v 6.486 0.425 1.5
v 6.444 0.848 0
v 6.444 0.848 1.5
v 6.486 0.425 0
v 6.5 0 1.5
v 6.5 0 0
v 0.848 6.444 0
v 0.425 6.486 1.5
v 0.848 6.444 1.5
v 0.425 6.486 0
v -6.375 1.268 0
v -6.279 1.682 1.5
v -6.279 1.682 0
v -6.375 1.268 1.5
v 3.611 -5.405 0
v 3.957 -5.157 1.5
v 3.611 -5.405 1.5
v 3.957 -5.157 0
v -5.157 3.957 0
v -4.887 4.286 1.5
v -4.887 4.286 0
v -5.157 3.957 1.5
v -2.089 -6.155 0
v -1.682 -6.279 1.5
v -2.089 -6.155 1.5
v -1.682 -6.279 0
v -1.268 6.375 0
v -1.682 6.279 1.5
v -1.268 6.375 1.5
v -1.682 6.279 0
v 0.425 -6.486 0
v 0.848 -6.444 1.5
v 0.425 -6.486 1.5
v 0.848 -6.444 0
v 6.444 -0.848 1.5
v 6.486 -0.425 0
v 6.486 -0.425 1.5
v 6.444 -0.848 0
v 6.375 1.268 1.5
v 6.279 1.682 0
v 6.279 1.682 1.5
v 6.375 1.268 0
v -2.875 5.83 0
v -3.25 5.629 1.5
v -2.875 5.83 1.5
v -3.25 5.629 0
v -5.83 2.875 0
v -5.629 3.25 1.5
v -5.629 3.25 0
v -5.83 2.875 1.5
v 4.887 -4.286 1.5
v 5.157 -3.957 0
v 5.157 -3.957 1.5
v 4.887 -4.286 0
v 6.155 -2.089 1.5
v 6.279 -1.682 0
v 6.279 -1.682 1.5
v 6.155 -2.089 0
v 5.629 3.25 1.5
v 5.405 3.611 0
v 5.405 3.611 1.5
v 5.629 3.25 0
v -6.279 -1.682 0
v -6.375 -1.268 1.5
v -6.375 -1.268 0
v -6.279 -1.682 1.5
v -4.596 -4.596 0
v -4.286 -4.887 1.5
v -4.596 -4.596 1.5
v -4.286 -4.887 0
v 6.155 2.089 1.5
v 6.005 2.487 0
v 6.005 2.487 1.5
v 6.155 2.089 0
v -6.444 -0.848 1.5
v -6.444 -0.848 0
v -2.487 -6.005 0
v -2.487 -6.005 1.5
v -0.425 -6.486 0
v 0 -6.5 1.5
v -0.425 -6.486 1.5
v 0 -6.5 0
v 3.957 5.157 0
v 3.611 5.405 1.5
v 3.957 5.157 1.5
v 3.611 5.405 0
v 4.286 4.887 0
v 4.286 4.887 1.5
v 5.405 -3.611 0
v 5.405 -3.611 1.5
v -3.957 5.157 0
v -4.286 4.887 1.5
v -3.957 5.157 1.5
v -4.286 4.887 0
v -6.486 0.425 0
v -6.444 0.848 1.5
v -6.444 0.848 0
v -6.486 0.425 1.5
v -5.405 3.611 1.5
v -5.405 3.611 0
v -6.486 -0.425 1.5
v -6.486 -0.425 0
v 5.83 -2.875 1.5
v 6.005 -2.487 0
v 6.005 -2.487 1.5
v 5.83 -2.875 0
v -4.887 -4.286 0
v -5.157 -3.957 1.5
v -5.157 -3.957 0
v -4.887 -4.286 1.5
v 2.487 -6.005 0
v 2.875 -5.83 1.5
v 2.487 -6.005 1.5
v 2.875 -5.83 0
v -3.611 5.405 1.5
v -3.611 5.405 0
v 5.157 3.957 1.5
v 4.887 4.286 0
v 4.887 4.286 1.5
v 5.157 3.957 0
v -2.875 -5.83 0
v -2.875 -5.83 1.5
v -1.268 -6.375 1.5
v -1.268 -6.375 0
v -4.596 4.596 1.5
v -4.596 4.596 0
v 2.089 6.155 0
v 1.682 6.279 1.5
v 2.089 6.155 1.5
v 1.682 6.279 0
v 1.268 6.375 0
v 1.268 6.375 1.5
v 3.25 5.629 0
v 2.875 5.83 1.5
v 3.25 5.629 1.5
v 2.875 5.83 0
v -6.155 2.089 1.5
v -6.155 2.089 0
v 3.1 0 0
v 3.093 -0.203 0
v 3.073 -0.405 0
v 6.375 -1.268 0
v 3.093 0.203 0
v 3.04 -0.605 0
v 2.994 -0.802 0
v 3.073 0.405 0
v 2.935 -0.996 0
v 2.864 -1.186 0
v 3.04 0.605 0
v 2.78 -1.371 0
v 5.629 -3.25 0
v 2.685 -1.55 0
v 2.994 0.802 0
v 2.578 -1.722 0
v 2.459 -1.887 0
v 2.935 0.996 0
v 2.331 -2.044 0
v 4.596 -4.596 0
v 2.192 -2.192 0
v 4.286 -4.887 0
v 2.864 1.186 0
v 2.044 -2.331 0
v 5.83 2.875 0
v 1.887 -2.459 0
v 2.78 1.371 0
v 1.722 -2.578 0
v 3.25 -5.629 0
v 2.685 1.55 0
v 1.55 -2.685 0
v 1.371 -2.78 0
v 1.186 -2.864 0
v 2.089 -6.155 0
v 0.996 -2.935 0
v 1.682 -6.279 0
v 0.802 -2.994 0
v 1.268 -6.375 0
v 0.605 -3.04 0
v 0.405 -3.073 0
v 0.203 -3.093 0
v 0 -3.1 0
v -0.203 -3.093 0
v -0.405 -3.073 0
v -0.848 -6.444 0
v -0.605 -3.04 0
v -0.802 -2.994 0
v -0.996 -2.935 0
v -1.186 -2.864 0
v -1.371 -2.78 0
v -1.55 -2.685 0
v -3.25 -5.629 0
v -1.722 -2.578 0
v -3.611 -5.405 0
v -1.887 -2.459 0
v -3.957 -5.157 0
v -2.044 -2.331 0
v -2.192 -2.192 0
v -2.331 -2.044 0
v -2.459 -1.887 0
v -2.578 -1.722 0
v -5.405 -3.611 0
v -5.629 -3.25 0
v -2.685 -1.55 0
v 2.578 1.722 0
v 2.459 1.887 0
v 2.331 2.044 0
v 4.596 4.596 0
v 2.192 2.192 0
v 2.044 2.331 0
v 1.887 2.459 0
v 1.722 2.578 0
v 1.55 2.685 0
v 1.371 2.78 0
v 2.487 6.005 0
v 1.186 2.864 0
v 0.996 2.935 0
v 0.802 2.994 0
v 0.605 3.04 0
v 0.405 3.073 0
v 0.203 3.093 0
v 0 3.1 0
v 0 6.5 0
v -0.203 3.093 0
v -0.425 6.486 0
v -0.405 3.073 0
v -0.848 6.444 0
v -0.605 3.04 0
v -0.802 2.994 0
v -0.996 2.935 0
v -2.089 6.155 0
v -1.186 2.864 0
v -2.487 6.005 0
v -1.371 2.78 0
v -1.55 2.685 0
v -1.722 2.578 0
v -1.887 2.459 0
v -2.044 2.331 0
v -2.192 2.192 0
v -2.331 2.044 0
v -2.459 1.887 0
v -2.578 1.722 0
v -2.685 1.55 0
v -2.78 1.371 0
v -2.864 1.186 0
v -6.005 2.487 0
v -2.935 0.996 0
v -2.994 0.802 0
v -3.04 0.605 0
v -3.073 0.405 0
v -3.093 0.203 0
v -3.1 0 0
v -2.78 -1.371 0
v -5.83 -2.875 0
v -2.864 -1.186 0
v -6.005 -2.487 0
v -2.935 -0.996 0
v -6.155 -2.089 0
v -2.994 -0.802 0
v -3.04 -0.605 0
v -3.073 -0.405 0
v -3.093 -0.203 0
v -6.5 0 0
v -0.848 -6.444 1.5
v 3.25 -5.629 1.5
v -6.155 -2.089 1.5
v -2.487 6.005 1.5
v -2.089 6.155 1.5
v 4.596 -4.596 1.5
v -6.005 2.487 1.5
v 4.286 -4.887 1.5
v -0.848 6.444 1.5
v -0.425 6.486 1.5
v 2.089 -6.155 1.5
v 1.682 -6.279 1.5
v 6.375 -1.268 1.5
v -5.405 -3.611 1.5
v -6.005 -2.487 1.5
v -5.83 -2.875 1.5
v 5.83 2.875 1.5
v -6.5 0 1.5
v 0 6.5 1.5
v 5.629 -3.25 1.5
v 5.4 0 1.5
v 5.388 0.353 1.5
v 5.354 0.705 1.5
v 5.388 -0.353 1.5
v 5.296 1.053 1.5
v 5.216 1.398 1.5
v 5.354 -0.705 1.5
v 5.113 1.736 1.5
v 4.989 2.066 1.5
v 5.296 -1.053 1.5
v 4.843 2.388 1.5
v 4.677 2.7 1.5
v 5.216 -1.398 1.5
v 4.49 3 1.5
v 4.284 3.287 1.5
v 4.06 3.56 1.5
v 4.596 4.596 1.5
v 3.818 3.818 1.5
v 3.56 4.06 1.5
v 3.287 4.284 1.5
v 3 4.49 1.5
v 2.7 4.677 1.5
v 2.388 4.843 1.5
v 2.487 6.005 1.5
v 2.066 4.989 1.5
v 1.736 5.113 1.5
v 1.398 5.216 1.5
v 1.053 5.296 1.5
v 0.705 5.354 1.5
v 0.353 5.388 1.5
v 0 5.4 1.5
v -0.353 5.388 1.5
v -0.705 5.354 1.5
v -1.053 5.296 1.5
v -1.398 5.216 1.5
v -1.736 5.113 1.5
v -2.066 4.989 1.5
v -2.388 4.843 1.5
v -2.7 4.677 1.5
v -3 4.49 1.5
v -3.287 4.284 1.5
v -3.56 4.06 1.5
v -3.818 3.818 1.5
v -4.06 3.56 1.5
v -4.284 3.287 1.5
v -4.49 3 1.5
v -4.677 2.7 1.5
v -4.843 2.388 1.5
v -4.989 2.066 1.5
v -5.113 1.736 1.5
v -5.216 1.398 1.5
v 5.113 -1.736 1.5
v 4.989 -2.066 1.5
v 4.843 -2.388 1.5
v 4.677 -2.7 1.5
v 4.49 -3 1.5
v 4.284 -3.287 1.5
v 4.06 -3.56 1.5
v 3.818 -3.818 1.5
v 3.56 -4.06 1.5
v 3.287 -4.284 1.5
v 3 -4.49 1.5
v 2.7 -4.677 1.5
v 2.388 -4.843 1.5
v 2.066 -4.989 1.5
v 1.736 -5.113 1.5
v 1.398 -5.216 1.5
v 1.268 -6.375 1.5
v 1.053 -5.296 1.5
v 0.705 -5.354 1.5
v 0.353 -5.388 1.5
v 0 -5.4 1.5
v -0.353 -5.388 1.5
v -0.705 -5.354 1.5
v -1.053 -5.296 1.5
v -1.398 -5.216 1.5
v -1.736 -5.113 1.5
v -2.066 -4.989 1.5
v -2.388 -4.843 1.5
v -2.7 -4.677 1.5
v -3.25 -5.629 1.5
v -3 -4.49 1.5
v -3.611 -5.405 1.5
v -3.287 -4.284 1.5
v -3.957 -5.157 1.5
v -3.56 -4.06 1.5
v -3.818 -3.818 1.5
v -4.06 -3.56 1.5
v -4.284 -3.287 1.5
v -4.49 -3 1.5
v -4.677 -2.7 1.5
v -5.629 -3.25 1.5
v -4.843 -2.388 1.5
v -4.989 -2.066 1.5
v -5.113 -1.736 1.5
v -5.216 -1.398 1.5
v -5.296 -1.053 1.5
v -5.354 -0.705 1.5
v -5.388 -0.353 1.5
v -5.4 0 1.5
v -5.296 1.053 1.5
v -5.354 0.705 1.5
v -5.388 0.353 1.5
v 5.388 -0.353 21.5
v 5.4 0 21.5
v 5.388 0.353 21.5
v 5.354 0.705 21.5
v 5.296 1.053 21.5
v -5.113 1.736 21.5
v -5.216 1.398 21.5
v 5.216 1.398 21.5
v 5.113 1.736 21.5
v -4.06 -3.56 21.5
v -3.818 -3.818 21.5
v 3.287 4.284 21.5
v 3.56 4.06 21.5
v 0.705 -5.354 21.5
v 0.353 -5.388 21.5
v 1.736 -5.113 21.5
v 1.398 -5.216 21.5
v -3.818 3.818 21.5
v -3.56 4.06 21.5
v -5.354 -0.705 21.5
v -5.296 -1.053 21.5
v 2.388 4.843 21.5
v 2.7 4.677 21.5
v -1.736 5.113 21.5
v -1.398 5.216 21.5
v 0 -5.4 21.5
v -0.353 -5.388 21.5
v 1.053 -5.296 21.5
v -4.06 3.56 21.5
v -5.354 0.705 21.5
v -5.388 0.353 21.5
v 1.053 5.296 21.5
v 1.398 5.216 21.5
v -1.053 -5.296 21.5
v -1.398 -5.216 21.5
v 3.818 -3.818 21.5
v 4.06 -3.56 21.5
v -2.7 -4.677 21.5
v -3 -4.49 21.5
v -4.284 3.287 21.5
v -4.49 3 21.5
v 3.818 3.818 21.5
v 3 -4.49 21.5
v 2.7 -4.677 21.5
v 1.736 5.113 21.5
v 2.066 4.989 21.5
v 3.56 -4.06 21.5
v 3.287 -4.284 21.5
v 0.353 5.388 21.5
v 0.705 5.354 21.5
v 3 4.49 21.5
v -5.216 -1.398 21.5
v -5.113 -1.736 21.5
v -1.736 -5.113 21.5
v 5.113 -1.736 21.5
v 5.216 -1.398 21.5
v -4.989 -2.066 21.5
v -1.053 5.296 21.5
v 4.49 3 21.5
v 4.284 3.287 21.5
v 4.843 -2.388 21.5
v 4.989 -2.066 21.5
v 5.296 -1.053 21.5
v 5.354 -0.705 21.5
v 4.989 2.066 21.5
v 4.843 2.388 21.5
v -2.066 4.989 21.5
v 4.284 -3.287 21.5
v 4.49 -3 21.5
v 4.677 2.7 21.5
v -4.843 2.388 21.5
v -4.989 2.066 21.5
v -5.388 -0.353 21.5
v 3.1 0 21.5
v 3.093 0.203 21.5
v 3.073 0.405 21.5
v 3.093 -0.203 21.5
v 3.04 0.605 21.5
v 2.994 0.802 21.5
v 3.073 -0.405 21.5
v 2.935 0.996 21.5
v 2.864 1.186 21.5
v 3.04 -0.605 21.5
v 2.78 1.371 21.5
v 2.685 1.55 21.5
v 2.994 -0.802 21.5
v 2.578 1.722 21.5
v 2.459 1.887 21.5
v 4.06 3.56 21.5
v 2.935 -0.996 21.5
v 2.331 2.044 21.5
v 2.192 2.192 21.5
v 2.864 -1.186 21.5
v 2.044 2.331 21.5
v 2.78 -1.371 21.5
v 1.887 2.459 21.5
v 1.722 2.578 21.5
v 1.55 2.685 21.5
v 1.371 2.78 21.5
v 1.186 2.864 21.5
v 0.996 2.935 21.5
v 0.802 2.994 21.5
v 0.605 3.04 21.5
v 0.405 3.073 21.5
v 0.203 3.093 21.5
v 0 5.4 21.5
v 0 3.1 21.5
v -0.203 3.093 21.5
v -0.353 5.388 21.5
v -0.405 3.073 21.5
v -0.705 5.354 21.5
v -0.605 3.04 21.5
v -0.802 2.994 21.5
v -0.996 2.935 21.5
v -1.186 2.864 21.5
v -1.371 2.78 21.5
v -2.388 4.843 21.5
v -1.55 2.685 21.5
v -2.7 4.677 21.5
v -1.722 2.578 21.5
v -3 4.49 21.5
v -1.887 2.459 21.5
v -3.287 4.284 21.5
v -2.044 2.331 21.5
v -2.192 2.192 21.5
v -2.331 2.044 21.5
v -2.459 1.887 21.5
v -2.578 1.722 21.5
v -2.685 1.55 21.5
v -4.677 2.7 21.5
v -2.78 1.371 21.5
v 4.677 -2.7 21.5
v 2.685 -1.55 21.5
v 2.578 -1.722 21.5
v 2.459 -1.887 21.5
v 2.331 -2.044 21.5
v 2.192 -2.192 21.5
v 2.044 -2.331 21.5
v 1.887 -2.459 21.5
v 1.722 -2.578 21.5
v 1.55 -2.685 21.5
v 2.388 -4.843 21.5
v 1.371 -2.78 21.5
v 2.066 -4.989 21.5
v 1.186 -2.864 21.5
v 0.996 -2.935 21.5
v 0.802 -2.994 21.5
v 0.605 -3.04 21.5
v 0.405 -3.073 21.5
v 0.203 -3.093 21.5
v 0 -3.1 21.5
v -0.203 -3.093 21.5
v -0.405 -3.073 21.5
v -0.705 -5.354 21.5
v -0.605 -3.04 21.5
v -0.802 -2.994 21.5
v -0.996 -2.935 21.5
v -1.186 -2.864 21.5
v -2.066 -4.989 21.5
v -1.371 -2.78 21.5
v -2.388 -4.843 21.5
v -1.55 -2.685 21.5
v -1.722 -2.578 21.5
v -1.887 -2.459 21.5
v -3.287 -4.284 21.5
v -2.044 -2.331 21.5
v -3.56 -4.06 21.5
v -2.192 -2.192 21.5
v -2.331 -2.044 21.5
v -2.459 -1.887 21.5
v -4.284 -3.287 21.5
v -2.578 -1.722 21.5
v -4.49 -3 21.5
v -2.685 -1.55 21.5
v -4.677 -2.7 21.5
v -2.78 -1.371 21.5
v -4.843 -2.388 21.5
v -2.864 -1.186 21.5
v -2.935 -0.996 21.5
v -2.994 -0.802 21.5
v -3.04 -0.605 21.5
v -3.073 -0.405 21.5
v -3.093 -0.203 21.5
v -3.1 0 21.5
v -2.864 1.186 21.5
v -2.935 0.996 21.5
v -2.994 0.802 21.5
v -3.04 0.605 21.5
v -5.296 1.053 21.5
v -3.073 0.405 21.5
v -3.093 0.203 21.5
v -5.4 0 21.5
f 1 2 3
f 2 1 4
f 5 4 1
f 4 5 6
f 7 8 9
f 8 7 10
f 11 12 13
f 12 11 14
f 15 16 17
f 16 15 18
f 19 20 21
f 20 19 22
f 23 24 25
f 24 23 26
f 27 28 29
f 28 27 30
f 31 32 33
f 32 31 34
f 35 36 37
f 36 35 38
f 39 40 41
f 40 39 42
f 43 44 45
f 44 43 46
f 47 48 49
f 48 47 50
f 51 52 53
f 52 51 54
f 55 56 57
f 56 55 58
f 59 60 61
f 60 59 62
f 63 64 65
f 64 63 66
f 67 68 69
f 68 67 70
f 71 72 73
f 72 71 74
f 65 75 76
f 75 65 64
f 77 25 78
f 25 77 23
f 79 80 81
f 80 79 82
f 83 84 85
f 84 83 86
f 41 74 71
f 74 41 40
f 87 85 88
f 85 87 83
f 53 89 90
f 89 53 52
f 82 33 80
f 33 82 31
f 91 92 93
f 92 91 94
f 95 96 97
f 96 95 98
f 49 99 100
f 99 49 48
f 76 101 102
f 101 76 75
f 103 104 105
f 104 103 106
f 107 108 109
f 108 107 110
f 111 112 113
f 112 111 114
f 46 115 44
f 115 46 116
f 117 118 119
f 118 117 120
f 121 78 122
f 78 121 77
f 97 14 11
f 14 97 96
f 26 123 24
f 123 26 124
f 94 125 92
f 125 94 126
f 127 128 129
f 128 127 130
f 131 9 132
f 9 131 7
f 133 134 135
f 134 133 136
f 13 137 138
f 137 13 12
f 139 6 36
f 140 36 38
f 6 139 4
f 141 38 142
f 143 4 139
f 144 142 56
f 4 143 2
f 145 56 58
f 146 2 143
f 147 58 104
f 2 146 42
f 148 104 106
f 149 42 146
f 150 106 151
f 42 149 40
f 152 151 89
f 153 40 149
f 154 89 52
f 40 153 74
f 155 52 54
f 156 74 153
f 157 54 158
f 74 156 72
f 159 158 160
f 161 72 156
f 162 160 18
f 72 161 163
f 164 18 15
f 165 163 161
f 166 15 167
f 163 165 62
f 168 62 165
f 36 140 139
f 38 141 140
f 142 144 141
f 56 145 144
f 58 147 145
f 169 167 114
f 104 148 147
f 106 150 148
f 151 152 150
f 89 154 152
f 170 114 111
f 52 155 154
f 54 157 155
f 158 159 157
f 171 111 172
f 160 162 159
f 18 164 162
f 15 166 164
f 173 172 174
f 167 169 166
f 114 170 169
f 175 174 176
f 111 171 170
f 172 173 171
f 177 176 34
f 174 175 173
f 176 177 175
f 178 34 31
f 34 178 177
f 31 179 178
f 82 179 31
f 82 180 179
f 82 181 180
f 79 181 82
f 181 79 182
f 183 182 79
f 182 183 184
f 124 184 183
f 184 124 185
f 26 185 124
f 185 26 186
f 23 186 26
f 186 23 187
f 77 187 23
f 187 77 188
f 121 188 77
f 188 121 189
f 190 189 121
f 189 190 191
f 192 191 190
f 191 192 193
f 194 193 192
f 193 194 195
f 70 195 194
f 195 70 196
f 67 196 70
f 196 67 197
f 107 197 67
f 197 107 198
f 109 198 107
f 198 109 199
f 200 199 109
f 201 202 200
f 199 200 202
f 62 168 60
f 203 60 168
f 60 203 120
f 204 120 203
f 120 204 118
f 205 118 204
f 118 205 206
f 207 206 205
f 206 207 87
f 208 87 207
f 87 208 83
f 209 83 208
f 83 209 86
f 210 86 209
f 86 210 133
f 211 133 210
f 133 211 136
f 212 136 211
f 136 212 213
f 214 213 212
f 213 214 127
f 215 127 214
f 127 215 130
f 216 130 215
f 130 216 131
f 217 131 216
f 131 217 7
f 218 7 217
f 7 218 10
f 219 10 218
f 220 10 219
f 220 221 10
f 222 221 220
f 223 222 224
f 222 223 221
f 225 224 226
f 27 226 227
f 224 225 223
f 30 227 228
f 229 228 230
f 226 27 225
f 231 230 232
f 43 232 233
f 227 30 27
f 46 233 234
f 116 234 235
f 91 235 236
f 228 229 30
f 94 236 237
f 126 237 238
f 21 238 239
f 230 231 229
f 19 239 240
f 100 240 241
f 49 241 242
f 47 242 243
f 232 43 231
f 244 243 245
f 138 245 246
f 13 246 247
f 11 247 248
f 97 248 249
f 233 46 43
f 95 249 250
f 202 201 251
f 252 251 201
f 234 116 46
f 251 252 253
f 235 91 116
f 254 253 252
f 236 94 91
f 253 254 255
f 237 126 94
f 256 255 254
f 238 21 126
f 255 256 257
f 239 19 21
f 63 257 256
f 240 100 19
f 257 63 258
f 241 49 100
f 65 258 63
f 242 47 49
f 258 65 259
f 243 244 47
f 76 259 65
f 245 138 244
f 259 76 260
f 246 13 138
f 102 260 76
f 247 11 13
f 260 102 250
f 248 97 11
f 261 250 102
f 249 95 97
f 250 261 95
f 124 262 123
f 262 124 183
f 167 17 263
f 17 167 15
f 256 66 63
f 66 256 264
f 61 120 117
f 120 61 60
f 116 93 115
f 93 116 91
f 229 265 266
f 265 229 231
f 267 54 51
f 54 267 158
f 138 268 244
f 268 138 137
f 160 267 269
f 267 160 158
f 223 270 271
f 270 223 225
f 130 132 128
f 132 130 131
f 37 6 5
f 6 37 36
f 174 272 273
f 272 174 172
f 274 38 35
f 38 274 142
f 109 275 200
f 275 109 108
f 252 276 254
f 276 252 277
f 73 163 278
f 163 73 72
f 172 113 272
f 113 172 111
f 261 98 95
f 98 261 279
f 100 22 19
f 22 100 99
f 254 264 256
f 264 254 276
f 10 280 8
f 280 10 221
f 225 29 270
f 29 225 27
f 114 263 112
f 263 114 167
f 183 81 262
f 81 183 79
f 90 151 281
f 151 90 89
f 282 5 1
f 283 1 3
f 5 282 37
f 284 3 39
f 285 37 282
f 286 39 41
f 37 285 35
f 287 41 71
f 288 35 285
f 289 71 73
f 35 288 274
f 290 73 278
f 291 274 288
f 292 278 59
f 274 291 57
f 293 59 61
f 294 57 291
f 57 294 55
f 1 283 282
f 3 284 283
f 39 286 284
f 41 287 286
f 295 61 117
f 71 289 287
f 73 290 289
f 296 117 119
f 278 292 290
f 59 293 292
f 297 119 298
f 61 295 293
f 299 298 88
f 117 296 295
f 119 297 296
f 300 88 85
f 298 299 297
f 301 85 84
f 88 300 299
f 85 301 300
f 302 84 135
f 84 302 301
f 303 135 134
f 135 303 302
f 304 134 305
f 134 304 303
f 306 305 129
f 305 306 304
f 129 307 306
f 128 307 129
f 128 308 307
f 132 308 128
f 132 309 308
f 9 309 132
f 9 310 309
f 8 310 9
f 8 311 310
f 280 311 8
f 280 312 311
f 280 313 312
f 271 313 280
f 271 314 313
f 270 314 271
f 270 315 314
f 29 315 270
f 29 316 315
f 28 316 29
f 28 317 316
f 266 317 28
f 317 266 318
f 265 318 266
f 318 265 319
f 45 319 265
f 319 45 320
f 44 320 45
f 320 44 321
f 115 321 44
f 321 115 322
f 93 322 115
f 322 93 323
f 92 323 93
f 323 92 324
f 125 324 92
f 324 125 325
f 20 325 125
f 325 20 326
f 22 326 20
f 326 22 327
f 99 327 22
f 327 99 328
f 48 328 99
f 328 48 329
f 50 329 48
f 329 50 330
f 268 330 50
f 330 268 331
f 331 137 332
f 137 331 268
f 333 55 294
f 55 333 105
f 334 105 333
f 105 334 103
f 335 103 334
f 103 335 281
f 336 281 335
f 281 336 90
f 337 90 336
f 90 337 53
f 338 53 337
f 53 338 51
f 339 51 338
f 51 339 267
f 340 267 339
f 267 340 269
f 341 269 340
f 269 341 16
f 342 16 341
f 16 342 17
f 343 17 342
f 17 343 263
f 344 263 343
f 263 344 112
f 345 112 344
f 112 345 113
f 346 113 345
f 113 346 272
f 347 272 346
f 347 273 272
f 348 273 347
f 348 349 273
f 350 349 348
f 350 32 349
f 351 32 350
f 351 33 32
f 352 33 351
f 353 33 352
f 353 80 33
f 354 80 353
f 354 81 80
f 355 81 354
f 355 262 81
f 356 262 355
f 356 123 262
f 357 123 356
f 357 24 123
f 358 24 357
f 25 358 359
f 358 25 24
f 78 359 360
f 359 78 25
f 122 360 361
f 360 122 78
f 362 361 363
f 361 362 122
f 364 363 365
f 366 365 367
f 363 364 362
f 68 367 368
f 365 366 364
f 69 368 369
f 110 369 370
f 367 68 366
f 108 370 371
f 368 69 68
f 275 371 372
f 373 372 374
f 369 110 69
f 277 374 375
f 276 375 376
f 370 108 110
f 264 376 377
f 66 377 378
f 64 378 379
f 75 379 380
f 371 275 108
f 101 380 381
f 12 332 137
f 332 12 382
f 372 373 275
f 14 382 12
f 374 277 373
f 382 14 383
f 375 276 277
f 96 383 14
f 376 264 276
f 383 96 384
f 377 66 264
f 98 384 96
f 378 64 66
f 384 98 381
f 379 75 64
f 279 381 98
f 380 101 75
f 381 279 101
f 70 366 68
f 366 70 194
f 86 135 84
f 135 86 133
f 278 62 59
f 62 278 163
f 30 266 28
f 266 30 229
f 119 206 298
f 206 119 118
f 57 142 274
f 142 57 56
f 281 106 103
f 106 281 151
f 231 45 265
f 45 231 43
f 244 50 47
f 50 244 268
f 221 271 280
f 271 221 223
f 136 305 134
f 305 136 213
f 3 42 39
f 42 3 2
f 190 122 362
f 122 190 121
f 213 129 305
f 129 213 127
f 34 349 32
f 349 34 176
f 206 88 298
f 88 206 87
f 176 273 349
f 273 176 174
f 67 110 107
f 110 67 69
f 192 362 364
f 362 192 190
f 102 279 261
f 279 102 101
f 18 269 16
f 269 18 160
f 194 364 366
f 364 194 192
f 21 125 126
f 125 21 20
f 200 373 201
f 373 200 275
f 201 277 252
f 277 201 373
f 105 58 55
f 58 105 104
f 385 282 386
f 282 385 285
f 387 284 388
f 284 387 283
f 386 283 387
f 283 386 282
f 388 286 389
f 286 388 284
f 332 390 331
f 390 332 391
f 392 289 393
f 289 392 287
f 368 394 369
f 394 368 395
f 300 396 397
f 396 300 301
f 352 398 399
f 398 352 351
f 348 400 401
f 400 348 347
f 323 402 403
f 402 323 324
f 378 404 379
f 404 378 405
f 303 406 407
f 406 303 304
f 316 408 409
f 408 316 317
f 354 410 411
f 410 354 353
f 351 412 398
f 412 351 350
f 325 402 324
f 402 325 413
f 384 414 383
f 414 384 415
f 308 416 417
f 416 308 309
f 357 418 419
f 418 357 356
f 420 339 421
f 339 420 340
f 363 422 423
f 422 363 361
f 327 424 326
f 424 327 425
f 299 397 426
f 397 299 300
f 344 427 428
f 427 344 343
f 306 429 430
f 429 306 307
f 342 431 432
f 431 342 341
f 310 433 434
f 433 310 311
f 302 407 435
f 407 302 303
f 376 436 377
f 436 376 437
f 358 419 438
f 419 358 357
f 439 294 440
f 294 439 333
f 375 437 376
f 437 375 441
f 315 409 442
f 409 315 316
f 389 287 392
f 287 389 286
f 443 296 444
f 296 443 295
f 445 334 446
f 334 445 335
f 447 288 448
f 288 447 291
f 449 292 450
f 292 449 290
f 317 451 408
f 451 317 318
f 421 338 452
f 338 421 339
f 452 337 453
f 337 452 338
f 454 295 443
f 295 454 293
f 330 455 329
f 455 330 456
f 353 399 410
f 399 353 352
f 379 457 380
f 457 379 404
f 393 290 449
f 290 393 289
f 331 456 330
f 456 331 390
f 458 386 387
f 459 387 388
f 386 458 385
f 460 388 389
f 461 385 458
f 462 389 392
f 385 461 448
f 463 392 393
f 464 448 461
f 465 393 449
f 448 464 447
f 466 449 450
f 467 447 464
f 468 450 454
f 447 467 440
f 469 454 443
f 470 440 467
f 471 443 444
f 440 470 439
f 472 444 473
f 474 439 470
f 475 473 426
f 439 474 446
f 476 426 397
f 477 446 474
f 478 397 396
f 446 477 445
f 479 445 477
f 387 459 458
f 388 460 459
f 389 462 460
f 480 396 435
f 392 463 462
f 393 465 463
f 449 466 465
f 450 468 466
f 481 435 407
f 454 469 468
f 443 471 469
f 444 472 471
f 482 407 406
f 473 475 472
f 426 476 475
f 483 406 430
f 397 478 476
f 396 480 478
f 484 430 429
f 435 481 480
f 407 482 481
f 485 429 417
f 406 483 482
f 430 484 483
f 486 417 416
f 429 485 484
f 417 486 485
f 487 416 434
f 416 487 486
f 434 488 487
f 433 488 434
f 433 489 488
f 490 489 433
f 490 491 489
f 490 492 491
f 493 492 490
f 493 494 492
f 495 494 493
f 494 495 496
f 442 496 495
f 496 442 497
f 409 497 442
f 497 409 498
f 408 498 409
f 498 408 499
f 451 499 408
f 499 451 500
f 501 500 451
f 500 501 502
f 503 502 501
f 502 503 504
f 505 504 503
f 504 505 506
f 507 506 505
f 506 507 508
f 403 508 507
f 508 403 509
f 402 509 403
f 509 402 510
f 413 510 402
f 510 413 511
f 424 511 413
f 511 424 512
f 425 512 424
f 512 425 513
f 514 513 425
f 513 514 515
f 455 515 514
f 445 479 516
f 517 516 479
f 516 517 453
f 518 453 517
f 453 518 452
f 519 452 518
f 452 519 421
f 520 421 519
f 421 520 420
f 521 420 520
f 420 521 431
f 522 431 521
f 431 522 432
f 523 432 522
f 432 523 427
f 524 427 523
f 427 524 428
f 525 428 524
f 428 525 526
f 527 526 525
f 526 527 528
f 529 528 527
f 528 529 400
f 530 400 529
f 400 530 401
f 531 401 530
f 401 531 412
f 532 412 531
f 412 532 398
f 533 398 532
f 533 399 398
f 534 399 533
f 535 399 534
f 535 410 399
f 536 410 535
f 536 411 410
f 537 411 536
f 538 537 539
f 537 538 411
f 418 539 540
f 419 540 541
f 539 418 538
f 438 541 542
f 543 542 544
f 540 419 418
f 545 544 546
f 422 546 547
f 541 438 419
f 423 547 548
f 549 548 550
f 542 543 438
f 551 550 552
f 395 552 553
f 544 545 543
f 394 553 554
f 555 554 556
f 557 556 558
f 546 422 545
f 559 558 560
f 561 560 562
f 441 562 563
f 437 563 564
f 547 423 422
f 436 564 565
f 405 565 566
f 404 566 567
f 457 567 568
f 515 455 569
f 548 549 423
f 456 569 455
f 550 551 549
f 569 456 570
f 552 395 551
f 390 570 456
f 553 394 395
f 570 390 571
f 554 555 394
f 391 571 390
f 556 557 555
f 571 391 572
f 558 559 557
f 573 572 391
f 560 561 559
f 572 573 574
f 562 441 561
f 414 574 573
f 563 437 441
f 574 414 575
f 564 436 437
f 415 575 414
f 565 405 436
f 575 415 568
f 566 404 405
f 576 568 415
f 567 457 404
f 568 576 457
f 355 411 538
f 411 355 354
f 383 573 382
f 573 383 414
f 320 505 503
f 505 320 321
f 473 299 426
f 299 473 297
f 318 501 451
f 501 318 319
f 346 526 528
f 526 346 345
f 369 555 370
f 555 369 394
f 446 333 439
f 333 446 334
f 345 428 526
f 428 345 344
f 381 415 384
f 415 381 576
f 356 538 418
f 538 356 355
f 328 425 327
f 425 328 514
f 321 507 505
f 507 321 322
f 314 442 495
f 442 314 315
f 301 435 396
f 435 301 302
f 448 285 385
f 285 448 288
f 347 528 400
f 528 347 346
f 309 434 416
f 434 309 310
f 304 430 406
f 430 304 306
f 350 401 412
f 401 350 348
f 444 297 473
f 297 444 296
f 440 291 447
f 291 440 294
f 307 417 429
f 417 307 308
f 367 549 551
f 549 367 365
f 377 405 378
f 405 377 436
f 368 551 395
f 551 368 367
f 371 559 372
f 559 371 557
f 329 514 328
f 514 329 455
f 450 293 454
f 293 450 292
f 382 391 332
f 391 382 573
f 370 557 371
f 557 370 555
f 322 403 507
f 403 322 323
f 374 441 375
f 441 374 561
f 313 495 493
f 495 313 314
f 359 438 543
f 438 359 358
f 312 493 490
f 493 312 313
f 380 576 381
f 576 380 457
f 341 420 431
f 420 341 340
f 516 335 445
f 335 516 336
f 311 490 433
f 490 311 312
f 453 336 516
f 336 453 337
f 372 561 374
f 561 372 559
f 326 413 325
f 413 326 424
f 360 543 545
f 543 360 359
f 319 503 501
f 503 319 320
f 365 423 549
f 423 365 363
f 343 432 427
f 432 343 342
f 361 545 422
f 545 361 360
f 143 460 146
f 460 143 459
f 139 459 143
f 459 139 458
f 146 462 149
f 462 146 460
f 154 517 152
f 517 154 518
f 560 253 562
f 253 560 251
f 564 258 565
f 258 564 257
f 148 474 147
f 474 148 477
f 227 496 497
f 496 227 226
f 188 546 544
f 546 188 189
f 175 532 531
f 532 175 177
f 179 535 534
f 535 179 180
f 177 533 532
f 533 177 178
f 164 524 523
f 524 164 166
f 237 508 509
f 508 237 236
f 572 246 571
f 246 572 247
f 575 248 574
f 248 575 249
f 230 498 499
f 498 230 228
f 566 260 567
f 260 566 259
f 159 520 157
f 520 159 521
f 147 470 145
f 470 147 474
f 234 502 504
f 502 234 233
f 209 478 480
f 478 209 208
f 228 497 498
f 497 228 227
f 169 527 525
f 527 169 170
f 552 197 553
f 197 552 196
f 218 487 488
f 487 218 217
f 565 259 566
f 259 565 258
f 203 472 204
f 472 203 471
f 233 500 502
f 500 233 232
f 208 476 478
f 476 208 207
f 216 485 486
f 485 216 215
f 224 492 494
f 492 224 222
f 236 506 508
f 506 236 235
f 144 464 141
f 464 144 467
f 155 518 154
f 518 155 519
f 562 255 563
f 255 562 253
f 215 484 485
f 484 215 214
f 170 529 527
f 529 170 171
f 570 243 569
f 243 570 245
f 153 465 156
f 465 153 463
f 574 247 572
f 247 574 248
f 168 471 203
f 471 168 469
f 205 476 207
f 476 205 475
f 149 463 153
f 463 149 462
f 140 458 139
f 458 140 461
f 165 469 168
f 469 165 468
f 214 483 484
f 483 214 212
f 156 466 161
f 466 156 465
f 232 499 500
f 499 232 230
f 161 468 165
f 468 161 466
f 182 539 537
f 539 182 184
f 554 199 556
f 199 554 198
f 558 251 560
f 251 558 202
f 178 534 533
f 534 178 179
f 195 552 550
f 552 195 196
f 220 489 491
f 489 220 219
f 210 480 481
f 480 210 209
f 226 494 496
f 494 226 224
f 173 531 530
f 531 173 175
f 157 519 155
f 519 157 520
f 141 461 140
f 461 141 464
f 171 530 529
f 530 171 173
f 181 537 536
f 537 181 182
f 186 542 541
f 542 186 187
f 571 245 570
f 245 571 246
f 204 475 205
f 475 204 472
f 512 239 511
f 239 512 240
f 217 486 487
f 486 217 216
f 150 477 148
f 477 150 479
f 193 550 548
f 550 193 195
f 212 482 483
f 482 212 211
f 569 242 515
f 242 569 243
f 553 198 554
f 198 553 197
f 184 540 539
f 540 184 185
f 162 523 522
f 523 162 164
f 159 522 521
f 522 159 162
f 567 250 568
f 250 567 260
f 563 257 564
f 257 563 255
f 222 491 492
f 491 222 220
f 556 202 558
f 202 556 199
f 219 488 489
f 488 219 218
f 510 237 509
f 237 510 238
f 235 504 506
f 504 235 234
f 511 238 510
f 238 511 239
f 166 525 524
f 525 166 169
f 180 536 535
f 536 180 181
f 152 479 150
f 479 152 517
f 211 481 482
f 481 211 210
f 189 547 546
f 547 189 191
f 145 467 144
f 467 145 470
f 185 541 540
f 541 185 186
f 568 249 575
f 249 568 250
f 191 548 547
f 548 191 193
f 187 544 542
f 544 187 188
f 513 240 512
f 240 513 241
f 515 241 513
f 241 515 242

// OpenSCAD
// Adapter sleeve: 0.2 mL PCR tube in a 1.5 mL tube rack hole
// Printed upside down: collar on the bed, sleeve body rising upward.

$fn = 96;

// ---- Dimensions (mm) ----
collar_d      = 13;    // collar outer diameter
collar_h      = 1.5;   // collar thickness (z = 0 to 1.5)
body_d        = 10.8;  // sleeve body outer diameter
total_h       = 21.5;  // overall height (top of sleeve body)
bore_d        = 6.2;   // straight through-bore diameter
eps           = 0.5;   // cutter overshoot past faces

difference() {
    union() {
        // Collar lying on the bed
        cylinder(d = collar_d, h = collar_h);
        // Sleeve body rising from the collar to total height
        translate([0, 0, collar_h - 0.01])
            cylinder(d = body_d, h = total_h - collar_h + 0.01);
    }
    // Through-bore, open at both ends
    translate([0, 0, -eps])
        cylinder(d = bore_d, h = total_h + 2 * eps);
}
